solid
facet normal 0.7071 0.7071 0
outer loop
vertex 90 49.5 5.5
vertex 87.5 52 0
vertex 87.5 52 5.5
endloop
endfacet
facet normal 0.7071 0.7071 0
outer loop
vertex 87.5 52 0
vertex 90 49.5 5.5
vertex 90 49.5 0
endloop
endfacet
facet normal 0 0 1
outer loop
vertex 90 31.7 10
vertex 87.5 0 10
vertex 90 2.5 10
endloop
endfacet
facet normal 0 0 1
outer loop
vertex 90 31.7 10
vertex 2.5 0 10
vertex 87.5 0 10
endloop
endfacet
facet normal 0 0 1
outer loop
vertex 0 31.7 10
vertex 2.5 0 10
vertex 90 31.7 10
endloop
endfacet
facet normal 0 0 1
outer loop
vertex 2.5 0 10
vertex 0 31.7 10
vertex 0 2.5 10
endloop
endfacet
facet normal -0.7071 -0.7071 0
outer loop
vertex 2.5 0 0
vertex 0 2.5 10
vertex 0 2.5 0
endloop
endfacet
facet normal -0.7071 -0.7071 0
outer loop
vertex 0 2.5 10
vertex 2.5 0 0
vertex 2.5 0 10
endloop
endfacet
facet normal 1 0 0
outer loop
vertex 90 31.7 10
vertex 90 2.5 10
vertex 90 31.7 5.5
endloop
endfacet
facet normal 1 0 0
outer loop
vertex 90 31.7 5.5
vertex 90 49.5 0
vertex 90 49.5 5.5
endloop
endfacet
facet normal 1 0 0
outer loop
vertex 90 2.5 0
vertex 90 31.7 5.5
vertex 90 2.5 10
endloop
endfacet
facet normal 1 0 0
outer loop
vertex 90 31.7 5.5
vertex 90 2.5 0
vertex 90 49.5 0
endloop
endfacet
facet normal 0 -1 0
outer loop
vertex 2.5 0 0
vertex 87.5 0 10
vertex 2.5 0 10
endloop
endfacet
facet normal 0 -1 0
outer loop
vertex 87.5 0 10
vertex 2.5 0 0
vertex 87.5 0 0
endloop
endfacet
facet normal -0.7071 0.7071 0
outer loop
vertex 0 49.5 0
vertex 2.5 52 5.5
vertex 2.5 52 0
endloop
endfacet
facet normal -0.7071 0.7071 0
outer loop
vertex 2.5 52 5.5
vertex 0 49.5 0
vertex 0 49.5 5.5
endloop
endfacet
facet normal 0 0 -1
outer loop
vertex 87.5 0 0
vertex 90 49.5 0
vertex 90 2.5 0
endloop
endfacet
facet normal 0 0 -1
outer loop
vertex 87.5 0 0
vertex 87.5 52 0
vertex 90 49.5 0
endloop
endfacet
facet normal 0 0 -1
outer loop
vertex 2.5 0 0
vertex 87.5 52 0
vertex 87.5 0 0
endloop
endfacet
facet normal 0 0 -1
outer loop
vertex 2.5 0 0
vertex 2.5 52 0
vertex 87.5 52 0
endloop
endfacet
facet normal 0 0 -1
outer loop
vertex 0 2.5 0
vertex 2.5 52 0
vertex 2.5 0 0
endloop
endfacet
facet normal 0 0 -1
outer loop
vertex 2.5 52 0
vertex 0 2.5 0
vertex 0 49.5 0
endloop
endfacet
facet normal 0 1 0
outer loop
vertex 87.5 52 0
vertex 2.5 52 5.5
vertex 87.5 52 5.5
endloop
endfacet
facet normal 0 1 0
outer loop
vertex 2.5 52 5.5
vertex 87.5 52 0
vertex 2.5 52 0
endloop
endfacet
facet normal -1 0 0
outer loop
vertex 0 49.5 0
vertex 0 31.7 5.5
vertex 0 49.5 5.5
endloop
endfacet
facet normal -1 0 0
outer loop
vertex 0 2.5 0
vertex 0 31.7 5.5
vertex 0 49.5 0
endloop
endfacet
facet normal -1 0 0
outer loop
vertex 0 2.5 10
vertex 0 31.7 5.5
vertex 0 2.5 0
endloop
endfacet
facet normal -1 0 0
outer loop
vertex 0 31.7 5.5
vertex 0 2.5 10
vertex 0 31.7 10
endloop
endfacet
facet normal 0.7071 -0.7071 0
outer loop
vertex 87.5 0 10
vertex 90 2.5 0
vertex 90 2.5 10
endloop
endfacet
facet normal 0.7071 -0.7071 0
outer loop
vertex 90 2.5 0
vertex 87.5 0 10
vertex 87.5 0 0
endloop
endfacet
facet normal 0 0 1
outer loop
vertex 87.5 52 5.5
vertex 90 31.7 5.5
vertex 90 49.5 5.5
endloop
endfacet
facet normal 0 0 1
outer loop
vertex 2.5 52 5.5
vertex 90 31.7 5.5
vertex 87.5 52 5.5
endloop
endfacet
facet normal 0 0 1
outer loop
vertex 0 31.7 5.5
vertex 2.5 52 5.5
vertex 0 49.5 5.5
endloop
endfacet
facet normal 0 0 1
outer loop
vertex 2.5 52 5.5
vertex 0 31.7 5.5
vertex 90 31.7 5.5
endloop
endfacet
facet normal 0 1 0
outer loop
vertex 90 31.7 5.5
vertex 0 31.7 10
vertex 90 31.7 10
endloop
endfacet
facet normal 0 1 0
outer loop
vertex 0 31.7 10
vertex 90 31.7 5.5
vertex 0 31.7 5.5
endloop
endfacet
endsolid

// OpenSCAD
$fn = 32;

// ----------------------------------------------------------------------
// Stepped bar: sidestep, 90 x 52 x 10/5.5 mm
// ----------------------------------------------------------------------

// --- parameters (mm) ---
bar_l = 90;               // bar length, X
bar_w = 52;               // bar width, Y
plate_t = 10;             // thickness of the thick zone, Z
thin_t = 5.5;             // thickness of the thin zone
corner_c = 2.5;           // corner chamfer of the bar
step_cut = 4.5;           // material removed from the thin zone
ledge_y = 31.7;           // start of the ledge from the front edge
depth_1 = 4.5;            // depth of cut 1 from the top face

profile = [[2.5, 0], [87.5, 0], [90, 2.5], [90, 49.5], [87.5, 52], [2.5, 52], [0, 49.5], [0, 2.5]];  // primary outline, 8 points, counter clockwise
void_1 = [[-1, 31.7], [91, 31.7], [91, 53], [-1, 53]];  // ledge cut along one edge, 4 points

// --- the one profile operation ---
difference() {
  linear_extrude(height = plate_t) polygon(points = profile);
  translate([0, 0, plate_t - depth_1])
    linear_extrude(height = depth_1 + 1) polygon(points = void_1);
}
